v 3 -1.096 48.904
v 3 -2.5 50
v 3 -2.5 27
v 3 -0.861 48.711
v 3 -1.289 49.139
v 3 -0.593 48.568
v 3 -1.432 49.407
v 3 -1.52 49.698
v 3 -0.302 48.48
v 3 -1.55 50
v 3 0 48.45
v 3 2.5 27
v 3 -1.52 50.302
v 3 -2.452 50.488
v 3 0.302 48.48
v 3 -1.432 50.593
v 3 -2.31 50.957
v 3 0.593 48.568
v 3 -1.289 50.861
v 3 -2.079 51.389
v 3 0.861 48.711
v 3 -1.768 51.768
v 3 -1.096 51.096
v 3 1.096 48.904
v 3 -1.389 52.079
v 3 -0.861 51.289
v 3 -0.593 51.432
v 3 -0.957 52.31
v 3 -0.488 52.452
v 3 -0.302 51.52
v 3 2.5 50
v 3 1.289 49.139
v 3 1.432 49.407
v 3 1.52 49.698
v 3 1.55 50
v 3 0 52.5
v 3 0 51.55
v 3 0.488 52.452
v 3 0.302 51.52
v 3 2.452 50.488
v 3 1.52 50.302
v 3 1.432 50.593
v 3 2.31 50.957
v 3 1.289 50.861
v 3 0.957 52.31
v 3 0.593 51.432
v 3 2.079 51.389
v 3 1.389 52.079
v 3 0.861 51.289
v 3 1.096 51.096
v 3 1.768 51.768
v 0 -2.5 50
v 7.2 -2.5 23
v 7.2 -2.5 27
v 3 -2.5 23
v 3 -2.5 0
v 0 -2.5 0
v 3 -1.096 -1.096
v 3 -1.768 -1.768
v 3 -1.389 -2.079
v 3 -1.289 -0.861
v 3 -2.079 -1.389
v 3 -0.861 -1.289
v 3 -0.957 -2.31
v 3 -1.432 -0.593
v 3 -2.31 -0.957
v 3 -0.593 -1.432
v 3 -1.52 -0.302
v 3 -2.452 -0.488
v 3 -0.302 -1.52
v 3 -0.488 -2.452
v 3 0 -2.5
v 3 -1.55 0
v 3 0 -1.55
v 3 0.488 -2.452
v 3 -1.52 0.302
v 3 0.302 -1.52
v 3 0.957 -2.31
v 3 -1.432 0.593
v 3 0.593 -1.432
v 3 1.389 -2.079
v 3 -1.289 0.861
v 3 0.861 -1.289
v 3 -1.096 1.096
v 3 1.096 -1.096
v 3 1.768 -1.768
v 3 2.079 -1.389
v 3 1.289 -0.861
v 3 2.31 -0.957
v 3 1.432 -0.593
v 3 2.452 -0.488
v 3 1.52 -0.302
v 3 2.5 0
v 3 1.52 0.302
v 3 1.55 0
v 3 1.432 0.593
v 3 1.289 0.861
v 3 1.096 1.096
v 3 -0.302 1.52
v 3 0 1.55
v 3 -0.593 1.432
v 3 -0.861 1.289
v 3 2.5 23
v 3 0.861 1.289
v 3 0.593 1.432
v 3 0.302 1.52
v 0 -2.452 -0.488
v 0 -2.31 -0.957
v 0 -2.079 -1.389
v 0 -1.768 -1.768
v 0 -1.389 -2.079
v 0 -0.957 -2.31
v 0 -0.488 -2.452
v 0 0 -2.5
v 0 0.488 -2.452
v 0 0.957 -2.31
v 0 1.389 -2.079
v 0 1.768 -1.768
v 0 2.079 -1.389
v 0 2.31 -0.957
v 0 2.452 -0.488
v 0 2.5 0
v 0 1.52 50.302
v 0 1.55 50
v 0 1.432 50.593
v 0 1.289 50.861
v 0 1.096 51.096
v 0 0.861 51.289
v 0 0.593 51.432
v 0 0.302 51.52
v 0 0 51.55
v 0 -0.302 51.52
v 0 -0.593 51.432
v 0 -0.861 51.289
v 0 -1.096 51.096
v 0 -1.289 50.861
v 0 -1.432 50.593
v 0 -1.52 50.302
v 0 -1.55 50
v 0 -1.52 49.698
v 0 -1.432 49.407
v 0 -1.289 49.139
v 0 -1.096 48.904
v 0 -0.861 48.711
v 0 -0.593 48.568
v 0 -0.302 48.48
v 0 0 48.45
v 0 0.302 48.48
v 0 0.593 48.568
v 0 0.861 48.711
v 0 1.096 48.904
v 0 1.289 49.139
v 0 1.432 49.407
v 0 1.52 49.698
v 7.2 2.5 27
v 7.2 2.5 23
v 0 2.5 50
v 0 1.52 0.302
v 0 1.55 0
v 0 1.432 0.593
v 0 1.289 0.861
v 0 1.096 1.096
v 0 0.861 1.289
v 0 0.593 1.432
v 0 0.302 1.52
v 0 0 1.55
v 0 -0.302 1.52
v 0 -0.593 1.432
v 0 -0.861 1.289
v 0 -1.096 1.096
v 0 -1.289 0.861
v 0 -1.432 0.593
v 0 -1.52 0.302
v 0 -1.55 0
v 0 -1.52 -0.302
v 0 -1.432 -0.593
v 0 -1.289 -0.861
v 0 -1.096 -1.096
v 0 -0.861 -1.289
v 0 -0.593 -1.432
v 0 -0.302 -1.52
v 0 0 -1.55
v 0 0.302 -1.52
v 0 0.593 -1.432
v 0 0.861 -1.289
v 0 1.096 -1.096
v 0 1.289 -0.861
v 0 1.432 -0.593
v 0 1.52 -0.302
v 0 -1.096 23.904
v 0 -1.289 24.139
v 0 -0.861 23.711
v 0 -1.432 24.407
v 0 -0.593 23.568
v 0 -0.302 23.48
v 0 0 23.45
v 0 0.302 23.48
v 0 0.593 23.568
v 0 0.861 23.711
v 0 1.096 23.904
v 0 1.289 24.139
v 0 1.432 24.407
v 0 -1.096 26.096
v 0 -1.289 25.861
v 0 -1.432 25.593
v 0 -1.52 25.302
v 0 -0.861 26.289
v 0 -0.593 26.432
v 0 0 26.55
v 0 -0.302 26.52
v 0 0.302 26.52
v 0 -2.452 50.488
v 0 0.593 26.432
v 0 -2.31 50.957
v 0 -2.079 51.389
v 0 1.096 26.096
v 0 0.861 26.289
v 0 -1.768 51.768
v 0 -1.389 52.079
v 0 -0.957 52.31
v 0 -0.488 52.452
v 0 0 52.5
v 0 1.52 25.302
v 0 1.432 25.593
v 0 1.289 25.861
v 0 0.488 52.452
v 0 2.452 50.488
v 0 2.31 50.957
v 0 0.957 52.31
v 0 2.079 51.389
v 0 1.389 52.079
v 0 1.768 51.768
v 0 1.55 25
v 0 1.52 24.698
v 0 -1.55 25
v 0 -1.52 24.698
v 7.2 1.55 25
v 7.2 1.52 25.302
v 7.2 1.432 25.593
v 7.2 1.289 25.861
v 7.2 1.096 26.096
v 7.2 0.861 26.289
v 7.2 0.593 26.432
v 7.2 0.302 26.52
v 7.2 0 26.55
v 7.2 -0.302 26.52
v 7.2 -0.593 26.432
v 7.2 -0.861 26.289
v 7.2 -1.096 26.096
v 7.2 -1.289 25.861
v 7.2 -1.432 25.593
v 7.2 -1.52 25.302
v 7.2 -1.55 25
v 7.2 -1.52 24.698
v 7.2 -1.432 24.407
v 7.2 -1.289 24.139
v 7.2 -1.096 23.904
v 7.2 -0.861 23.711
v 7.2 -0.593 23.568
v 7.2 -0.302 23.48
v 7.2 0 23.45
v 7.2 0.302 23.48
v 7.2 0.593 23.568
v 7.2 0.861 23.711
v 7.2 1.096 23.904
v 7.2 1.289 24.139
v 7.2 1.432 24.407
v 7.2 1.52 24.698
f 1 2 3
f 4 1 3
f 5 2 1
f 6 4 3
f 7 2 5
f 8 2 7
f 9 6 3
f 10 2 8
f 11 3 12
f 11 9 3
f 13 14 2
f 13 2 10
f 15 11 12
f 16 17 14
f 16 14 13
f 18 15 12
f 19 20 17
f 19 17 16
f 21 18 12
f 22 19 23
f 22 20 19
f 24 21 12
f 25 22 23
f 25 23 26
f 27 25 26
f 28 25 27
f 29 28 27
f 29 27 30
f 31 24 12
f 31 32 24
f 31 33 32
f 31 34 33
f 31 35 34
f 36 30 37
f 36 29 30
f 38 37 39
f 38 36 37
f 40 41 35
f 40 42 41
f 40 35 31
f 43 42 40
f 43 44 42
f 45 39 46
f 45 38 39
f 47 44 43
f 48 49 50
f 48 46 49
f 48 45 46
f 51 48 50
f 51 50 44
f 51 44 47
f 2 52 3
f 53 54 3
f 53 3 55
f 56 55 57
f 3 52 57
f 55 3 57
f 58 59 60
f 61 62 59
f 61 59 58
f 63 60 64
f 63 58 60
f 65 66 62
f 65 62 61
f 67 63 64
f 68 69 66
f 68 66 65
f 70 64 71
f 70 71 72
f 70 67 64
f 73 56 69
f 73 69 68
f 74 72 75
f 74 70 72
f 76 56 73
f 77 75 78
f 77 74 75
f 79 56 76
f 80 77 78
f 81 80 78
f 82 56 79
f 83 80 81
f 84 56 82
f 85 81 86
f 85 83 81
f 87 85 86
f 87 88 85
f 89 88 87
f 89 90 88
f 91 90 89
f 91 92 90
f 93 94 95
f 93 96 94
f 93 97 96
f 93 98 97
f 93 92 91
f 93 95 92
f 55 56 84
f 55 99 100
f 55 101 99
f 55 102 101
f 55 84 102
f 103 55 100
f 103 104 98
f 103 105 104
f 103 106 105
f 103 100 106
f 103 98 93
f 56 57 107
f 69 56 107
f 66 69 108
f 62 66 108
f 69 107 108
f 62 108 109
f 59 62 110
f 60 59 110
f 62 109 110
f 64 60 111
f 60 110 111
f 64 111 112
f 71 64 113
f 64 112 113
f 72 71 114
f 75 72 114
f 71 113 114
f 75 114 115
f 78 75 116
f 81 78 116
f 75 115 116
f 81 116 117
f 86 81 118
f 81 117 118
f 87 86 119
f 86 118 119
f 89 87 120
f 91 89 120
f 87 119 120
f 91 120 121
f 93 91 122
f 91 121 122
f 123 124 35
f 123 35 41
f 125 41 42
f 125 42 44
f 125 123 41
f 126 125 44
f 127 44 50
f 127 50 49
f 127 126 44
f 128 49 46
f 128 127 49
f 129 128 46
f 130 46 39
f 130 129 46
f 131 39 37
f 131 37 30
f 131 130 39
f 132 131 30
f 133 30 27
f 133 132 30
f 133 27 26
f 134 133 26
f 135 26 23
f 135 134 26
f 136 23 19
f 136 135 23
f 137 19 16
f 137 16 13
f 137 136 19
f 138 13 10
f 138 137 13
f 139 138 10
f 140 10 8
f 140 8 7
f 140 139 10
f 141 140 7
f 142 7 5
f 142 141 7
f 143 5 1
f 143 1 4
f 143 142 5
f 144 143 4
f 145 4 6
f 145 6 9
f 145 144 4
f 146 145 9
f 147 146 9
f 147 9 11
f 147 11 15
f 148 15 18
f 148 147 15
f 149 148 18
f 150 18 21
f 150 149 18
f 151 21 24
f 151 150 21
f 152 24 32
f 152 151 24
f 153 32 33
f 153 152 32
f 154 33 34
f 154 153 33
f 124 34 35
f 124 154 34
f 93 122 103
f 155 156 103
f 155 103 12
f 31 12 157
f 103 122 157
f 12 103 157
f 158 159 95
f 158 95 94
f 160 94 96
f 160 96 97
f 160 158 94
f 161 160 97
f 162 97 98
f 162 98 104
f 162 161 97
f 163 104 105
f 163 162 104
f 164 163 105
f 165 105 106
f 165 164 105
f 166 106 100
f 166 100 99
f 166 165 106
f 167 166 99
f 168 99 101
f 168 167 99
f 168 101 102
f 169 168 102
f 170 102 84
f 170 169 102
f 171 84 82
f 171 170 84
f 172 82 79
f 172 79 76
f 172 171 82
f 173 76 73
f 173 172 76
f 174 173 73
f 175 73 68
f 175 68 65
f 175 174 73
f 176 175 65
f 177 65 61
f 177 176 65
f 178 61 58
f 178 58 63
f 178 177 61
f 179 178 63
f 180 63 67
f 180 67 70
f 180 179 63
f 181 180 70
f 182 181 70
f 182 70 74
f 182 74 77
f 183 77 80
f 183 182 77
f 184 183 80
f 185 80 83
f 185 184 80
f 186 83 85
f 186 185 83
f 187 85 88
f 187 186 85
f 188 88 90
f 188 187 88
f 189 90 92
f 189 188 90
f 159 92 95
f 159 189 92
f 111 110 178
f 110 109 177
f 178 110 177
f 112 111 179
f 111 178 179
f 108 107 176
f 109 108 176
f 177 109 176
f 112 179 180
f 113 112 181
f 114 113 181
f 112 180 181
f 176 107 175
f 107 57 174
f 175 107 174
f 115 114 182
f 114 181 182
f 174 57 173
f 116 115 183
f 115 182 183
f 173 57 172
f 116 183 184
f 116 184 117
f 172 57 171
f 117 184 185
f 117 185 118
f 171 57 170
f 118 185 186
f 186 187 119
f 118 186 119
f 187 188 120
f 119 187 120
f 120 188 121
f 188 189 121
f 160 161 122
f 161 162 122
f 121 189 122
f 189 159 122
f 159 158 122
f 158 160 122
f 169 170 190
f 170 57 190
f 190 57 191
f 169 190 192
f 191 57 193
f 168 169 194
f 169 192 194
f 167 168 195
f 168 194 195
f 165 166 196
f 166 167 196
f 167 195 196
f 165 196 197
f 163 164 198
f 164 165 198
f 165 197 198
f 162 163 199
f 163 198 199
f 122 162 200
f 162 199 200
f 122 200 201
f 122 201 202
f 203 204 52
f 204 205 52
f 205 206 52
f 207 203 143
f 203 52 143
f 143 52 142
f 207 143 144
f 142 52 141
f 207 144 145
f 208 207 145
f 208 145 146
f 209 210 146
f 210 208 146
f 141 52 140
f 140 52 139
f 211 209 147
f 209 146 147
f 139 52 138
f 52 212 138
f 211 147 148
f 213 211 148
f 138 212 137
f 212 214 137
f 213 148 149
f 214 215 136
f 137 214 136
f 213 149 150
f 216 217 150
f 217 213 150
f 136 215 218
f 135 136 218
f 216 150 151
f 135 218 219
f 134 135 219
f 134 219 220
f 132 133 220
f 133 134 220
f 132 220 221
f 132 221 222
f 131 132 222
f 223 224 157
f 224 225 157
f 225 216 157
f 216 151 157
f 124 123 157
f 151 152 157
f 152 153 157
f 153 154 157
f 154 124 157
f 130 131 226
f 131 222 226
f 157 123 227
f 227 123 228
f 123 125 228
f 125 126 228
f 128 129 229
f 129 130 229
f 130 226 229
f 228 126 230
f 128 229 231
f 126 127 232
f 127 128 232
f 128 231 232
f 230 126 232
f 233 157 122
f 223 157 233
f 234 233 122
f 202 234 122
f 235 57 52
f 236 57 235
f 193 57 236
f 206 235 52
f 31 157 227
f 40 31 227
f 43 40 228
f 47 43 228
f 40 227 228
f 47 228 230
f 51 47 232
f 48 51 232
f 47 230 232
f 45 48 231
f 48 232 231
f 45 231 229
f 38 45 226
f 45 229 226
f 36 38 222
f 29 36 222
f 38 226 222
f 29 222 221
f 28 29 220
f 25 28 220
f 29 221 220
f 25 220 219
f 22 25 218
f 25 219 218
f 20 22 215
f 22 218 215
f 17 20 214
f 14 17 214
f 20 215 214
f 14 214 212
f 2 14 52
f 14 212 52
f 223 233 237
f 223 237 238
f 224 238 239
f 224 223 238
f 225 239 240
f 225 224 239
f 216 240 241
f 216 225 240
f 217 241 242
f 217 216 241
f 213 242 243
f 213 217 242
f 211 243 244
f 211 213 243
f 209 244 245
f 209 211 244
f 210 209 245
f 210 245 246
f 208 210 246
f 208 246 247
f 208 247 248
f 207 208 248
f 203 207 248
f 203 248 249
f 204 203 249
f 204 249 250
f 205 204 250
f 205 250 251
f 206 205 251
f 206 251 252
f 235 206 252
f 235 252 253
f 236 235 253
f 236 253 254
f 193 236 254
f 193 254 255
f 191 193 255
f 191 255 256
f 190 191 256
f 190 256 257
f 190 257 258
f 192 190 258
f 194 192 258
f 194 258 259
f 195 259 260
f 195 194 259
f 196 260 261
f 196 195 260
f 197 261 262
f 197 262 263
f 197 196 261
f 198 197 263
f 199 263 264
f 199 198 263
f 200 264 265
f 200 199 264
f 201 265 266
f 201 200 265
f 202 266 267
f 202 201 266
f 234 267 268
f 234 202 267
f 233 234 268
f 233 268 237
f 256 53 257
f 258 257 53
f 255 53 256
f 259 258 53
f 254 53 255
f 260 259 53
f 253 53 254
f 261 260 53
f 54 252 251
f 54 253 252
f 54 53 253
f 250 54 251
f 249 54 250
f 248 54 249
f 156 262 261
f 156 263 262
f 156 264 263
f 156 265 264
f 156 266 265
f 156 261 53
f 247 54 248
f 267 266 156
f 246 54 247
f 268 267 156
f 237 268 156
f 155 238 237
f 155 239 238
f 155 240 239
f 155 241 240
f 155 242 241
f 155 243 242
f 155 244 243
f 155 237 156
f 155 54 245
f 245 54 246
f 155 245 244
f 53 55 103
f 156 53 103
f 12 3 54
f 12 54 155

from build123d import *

# Parameters (mm, degrees)
F0_R     = 1.55
F0_W     = 5
F0_H     = 4
F1_DEPTH = 3
F2_DEPTH = 7.2


with BuildPart() as f1:
    # F0 (on Right) → F1 (new body)
    with BuildSketch(Plane.YZ):
        with BuildLine():
            Line((-2.5, 50), (-2.5, 27))
            Line((-2.5, 27), (2.5, 27))
            Line((2.5, 27), (2.5, 50))
            ThreePointArc((2.5, 50), (0, 52.5), (-2.5, 50))
        make_face()
        with Locations((0, 50)):
            Circle(F0_R, mode=Mode.SUBTRACT)
        with Locations((0, 25)):
            Rectangle(F0_W, F0_H)
        with Locations((0, 25)):
            Circle(F0_R, mode=Mode.SUBTRACT)
        with BuildLine():
            Line((-2.5, 23), (-2.5, 0))
            ThreePointArc((-2.5, 0), (0, -2.5), (2.5, 0))
            Line((2.5, 0), (2.5, 23))
            Line((2.5, 23), (-2.5, 23))
        make_face()
        Circle(F0_R, mode=Mode.SUBTRACT)
    extrude(amount=F1_DEPTH)

    # F0 (on Right) → F2 (join)
    with BuildSketch(Plane.YZ):
        with Locations((0, 25)):
            Rectangle(F0_W, F0_H)
        with Locations((0, 25)):
            Circle(F0_R, mode=Mode.SUBTRACT)
    extrude(amount=F2_DEPTH)


solid = f1.part
